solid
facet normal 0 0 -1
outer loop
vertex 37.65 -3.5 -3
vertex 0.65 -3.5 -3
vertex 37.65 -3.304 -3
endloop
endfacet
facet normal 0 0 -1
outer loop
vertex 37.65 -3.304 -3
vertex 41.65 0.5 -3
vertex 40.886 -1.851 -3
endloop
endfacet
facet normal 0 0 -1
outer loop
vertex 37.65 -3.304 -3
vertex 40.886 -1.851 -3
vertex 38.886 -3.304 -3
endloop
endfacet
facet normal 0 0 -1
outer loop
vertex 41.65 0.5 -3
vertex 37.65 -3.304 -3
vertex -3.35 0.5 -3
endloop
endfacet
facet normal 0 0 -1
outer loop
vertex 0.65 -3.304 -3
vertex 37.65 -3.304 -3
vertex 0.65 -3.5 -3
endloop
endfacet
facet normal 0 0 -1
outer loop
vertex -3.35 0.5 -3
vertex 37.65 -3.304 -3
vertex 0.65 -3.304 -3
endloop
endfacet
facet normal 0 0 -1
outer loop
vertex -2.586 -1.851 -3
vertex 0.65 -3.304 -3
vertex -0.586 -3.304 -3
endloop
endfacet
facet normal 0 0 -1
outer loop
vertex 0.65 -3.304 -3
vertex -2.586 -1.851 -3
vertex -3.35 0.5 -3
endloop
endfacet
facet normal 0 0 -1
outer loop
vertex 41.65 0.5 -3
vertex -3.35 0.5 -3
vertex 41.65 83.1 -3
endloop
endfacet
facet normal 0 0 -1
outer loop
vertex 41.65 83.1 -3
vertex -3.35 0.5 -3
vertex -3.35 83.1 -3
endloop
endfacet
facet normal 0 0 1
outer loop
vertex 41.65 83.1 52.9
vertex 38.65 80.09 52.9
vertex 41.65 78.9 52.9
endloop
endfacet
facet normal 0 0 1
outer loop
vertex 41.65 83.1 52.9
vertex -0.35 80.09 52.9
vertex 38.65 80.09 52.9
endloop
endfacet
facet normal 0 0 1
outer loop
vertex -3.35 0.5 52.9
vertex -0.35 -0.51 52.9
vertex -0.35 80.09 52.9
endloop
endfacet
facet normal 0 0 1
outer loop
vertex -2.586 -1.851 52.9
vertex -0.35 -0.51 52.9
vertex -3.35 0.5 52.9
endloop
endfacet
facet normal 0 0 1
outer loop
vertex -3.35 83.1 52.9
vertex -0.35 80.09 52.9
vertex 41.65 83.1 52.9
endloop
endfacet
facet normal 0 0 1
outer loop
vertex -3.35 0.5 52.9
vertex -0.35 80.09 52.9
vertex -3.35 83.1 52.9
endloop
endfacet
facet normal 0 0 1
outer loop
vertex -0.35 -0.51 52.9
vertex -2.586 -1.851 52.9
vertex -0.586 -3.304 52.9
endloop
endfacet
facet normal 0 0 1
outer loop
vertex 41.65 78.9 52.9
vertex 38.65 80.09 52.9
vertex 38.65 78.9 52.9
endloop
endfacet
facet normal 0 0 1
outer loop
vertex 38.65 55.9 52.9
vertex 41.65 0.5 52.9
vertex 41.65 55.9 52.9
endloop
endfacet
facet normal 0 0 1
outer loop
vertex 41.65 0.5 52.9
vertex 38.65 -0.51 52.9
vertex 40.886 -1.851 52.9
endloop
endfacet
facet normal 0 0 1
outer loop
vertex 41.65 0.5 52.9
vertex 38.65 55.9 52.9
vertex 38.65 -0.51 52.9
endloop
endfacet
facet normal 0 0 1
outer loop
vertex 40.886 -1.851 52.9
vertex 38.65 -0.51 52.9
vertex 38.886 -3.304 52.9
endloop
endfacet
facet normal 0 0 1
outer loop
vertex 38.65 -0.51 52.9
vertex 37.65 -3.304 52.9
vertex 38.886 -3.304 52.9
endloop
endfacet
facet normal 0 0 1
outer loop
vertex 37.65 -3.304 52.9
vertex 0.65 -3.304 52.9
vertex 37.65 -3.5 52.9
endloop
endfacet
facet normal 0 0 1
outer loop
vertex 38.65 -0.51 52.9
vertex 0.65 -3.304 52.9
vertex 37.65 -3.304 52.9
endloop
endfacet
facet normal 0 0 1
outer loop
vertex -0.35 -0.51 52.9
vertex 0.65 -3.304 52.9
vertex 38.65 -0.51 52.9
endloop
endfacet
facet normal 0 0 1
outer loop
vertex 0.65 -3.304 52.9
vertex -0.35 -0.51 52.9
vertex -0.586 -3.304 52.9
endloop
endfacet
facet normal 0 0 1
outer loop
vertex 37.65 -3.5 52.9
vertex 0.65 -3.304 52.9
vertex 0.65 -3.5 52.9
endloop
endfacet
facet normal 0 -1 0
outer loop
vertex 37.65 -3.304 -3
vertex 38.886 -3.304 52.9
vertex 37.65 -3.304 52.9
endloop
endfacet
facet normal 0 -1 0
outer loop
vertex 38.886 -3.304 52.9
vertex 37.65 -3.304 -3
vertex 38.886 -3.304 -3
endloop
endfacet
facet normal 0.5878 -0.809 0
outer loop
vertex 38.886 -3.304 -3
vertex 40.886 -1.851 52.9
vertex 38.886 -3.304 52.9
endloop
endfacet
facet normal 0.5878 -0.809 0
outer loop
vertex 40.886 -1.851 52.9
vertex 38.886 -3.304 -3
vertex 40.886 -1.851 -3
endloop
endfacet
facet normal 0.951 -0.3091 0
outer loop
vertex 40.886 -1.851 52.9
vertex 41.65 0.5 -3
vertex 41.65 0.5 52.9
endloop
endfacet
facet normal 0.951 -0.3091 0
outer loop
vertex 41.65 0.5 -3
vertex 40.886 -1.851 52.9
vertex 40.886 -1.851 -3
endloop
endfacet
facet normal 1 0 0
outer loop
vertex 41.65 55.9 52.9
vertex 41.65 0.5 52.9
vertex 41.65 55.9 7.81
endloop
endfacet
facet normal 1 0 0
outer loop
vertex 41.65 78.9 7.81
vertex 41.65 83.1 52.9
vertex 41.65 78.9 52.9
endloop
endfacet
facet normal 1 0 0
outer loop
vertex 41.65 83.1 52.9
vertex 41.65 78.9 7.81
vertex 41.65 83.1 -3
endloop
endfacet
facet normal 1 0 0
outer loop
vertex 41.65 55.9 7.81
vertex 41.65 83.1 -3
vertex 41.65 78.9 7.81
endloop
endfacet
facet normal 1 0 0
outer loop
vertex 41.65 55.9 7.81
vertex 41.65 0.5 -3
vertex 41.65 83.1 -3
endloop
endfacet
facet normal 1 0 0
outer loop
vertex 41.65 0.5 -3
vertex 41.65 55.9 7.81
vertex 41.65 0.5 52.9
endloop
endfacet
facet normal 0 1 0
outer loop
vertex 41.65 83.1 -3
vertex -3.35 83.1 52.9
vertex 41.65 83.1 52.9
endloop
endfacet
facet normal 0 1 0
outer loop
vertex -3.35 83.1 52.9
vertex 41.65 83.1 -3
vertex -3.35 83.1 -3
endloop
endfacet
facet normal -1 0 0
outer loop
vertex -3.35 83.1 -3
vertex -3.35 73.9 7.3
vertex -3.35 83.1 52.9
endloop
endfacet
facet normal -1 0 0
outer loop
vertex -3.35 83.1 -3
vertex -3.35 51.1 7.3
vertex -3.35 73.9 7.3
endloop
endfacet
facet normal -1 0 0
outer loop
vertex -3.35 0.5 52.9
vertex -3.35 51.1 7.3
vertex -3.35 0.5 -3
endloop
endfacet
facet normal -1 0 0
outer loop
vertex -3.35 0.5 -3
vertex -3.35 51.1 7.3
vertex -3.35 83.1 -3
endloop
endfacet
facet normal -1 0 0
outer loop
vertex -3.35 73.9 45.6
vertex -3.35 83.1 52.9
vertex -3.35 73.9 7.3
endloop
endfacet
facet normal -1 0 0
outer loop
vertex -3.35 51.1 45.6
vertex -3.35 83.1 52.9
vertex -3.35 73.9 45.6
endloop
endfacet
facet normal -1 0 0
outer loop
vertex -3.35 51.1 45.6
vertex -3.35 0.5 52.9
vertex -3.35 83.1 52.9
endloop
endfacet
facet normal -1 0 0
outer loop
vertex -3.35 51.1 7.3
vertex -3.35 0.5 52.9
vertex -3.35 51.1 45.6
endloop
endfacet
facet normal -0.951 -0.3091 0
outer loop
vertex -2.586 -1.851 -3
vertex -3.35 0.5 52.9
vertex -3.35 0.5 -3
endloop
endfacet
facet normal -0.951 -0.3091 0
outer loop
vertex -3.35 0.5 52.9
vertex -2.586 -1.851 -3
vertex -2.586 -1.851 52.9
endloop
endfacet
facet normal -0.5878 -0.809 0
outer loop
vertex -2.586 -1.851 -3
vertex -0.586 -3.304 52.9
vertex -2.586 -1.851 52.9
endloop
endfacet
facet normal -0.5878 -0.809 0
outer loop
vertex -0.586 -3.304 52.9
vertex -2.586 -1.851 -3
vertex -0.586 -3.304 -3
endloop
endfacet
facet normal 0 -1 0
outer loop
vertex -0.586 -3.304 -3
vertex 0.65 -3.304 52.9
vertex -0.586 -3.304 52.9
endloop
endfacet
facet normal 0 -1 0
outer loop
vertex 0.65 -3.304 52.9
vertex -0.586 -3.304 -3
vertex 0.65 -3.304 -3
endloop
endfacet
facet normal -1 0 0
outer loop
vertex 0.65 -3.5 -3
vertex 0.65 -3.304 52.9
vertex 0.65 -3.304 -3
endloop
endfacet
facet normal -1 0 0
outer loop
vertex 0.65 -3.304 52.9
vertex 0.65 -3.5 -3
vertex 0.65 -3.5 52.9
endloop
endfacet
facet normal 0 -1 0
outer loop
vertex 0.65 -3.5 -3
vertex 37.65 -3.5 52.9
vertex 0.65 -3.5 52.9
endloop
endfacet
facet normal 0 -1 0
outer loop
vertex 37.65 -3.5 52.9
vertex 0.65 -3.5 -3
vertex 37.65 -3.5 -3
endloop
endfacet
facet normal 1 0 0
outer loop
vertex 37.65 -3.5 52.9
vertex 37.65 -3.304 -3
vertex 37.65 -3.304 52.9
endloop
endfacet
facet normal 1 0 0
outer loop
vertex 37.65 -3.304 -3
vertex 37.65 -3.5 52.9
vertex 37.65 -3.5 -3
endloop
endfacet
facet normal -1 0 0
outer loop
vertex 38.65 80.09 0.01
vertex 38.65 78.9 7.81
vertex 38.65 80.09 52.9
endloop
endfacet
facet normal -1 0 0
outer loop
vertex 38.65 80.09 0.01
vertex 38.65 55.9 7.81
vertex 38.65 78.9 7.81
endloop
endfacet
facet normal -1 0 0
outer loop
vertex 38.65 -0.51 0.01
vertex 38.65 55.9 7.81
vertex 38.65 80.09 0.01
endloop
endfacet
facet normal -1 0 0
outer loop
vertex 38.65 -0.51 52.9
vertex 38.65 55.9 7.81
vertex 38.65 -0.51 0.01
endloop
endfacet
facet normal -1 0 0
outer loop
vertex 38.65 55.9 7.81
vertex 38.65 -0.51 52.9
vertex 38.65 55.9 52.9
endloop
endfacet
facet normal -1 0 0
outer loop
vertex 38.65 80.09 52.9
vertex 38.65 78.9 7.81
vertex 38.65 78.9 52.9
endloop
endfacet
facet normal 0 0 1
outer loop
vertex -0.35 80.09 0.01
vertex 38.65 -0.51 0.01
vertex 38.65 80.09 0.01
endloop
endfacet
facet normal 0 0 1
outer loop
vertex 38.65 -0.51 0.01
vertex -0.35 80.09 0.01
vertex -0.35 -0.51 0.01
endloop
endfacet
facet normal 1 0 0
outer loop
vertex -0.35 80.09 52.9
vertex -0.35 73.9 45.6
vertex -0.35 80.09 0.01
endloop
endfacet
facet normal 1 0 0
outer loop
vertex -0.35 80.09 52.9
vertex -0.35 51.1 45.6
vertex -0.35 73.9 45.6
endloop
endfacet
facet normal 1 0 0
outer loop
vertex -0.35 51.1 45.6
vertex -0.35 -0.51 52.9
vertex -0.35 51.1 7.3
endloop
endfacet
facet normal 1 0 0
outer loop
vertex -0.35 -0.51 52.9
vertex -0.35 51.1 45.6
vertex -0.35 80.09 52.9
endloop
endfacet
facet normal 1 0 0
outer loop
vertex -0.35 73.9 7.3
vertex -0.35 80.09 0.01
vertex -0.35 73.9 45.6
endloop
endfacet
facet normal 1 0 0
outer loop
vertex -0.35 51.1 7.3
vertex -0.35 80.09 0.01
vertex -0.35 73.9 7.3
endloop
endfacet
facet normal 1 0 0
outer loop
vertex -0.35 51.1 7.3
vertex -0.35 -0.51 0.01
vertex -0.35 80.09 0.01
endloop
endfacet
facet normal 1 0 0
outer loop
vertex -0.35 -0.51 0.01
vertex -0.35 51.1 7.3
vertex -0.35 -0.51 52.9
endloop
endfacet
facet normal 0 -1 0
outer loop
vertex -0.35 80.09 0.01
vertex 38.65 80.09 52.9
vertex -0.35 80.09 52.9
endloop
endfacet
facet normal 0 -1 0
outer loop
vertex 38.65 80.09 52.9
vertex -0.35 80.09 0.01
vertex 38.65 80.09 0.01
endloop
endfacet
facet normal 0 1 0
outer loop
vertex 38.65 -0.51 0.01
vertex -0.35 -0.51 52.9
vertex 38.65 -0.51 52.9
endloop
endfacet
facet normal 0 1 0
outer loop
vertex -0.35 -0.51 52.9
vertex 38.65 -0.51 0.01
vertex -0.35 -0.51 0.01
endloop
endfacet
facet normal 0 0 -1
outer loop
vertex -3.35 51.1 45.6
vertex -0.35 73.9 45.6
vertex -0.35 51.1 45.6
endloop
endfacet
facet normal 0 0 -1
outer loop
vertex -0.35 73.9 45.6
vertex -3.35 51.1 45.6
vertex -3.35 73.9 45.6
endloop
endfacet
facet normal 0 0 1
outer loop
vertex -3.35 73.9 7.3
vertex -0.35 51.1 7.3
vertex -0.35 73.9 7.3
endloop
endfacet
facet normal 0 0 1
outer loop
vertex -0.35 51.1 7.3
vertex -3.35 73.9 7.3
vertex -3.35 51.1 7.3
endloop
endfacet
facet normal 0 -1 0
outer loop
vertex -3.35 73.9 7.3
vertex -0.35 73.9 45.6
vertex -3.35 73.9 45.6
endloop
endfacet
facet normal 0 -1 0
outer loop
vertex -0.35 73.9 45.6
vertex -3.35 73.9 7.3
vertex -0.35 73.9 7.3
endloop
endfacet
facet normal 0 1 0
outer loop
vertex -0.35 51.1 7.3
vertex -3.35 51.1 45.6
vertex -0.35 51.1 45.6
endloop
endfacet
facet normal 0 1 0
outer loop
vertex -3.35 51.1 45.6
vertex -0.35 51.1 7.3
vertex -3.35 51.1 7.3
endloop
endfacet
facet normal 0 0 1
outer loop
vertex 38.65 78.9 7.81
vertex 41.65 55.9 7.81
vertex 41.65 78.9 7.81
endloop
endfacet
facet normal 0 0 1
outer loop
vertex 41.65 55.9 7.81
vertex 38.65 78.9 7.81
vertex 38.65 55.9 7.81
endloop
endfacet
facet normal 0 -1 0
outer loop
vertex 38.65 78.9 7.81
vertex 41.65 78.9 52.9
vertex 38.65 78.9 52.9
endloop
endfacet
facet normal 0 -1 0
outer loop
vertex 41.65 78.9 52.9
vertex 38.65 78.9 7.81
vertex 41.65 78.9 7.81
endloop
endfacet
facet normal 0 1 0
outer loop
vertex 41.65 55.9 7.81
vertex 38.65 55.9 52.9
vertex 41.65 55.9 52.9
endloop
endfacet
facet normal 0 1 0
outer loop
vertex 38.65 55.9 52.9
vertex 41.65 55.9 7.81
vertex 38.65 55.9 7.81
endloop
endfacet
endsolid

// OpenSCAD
// file: holder.scad
space_between = 0.3;
in_w = 38.4+space_between*2;
in_h = 80+space_between*2;
in_d = 52.3+space_between*2;
wall_side = 3;
wall_z = 3;
border_radius = 4;

epsilon = 0.01;

w = in_w + wall_side*2;
h = in_h + wall_side*2;

module wall_mount() {
  difference() {
    linear_extrude(wall_z+in_d)
      plate();
    translate([0,wall_side-epsilon,wall_z+epsilon])
      inside();
    translate([-in_w/2,wall_side+space_between+52.8,in_d/2+wall_z])
      bottom_plug_cutout();
    translate([in_w/2,wall_side+space_between+57.6,wall_z])
      top_plug_cutout();
  }
}

module plate() {
  translate([-w/2,border_radius])
    square([w, h-border_radius]);
  translate([-w/2+border_radius,0])
    square([w-2*border_radius, h-border_radius]);
  translate([w/2-border_radius, border_radius])
    circle(border_radius);
  translate([-w/2+border_radius, border_radius])
    circle(border_radius);
}

module inside() {
  translate([-in_w/2,0,0])
    cube([in_w, in_h, in_d]);
}

module bottom_plug_cutout() {
  plug_d = 35.3;
  plug_h = 19.8;
  space_per_side = 1.5;
  my_h = plug_h + 2*space_per_side;
  my_d = plug_d + 2*space_per_side;
  translate([-wall_side-epsilon, -space_per_side, -my_d/2])
    cube([wall_side+2*epsilon, my_h, my_d]);
}

module top_plug_cutout() {
  plug_h = 20;
  plug_d_offset =  7.5;
  space_per_side = 1.5;
  my_h = plug_h+2*space_per_side;
  my_d = in_d - space_between - plug_d_offset;
  translate([-epsilon, -space_per_side, plug_d_offset+space_between+epsilon])
    cube([wall_side+2*epsilon, my_h, my_d]);
}
// file: adapter.scad
module my_strom_adapter() {
  h = 80;
  w = 52.3;
  round_h = 66;
  top_r = 31.8;
  depth = 38.4;

  color("blue")
    linear_extrude(depth) base();
  toggle();
  translate([w/2,53.9,depth]) plug_top();
  translate([w/2,52.8,0]) plug_bottom();
  
  module plug_top() {
    width = 42.6;
    w2 = 22/2;
    height = 26.8;
    h2 = 6/2;
    depth = 67.8;
    color("green") translate([-width/2,0,0]) linear_extrude(depth)
      polygon(points=[[width/2-w2,0],
        [0,height/2-h2],[0,height/2+h2],
        [width/2-w2,height], [width/2+w2,height],
        [width,height/2+h2],[width,height/2-h2],
        [width/2+w2,0], [width/2-w2,0]]);
  }

  module plug_bottom() {
    width = 35.3;
    w2 = 17.3/2;
    height = 19.8;
    depth = 31.6;
    color("green") translate([-width/2,0,-depth]) linear_extrude(depth)
      polygon(points=[[width/2-w2,0],
        [0, height/2], [width/2-w2,height],
        [width/2+w2,height],
        [width, height/2],
        [width/2+w2,0], [width/2-w2,0]]);
  }

  module toggle() {
    switch = [15.5, 14.9];
    color("blue") translate([w/2,0,switch[1]/2+7])
      cube([switch[0], .1, switch[1]], center=true);
  }

  module base() {
    intersection() {
      color("blue")
        translate([w/2, h-top_r])
        circle(top_r, $fn=360);
      translate([0, round_h])
        square([w, h-round_h]);
    }
    square([w, round_h]);
  }
}
// main file
$fn = 10;

include <adapter.scad>
include <holder.scad>

*translate([0,0,in_d]) rotate([0,90,0])
  my_strom_adapter();

translate([in_w/2-0.35,-wall_side-0.5,-wall_z]) {
  wall_mount();
}
